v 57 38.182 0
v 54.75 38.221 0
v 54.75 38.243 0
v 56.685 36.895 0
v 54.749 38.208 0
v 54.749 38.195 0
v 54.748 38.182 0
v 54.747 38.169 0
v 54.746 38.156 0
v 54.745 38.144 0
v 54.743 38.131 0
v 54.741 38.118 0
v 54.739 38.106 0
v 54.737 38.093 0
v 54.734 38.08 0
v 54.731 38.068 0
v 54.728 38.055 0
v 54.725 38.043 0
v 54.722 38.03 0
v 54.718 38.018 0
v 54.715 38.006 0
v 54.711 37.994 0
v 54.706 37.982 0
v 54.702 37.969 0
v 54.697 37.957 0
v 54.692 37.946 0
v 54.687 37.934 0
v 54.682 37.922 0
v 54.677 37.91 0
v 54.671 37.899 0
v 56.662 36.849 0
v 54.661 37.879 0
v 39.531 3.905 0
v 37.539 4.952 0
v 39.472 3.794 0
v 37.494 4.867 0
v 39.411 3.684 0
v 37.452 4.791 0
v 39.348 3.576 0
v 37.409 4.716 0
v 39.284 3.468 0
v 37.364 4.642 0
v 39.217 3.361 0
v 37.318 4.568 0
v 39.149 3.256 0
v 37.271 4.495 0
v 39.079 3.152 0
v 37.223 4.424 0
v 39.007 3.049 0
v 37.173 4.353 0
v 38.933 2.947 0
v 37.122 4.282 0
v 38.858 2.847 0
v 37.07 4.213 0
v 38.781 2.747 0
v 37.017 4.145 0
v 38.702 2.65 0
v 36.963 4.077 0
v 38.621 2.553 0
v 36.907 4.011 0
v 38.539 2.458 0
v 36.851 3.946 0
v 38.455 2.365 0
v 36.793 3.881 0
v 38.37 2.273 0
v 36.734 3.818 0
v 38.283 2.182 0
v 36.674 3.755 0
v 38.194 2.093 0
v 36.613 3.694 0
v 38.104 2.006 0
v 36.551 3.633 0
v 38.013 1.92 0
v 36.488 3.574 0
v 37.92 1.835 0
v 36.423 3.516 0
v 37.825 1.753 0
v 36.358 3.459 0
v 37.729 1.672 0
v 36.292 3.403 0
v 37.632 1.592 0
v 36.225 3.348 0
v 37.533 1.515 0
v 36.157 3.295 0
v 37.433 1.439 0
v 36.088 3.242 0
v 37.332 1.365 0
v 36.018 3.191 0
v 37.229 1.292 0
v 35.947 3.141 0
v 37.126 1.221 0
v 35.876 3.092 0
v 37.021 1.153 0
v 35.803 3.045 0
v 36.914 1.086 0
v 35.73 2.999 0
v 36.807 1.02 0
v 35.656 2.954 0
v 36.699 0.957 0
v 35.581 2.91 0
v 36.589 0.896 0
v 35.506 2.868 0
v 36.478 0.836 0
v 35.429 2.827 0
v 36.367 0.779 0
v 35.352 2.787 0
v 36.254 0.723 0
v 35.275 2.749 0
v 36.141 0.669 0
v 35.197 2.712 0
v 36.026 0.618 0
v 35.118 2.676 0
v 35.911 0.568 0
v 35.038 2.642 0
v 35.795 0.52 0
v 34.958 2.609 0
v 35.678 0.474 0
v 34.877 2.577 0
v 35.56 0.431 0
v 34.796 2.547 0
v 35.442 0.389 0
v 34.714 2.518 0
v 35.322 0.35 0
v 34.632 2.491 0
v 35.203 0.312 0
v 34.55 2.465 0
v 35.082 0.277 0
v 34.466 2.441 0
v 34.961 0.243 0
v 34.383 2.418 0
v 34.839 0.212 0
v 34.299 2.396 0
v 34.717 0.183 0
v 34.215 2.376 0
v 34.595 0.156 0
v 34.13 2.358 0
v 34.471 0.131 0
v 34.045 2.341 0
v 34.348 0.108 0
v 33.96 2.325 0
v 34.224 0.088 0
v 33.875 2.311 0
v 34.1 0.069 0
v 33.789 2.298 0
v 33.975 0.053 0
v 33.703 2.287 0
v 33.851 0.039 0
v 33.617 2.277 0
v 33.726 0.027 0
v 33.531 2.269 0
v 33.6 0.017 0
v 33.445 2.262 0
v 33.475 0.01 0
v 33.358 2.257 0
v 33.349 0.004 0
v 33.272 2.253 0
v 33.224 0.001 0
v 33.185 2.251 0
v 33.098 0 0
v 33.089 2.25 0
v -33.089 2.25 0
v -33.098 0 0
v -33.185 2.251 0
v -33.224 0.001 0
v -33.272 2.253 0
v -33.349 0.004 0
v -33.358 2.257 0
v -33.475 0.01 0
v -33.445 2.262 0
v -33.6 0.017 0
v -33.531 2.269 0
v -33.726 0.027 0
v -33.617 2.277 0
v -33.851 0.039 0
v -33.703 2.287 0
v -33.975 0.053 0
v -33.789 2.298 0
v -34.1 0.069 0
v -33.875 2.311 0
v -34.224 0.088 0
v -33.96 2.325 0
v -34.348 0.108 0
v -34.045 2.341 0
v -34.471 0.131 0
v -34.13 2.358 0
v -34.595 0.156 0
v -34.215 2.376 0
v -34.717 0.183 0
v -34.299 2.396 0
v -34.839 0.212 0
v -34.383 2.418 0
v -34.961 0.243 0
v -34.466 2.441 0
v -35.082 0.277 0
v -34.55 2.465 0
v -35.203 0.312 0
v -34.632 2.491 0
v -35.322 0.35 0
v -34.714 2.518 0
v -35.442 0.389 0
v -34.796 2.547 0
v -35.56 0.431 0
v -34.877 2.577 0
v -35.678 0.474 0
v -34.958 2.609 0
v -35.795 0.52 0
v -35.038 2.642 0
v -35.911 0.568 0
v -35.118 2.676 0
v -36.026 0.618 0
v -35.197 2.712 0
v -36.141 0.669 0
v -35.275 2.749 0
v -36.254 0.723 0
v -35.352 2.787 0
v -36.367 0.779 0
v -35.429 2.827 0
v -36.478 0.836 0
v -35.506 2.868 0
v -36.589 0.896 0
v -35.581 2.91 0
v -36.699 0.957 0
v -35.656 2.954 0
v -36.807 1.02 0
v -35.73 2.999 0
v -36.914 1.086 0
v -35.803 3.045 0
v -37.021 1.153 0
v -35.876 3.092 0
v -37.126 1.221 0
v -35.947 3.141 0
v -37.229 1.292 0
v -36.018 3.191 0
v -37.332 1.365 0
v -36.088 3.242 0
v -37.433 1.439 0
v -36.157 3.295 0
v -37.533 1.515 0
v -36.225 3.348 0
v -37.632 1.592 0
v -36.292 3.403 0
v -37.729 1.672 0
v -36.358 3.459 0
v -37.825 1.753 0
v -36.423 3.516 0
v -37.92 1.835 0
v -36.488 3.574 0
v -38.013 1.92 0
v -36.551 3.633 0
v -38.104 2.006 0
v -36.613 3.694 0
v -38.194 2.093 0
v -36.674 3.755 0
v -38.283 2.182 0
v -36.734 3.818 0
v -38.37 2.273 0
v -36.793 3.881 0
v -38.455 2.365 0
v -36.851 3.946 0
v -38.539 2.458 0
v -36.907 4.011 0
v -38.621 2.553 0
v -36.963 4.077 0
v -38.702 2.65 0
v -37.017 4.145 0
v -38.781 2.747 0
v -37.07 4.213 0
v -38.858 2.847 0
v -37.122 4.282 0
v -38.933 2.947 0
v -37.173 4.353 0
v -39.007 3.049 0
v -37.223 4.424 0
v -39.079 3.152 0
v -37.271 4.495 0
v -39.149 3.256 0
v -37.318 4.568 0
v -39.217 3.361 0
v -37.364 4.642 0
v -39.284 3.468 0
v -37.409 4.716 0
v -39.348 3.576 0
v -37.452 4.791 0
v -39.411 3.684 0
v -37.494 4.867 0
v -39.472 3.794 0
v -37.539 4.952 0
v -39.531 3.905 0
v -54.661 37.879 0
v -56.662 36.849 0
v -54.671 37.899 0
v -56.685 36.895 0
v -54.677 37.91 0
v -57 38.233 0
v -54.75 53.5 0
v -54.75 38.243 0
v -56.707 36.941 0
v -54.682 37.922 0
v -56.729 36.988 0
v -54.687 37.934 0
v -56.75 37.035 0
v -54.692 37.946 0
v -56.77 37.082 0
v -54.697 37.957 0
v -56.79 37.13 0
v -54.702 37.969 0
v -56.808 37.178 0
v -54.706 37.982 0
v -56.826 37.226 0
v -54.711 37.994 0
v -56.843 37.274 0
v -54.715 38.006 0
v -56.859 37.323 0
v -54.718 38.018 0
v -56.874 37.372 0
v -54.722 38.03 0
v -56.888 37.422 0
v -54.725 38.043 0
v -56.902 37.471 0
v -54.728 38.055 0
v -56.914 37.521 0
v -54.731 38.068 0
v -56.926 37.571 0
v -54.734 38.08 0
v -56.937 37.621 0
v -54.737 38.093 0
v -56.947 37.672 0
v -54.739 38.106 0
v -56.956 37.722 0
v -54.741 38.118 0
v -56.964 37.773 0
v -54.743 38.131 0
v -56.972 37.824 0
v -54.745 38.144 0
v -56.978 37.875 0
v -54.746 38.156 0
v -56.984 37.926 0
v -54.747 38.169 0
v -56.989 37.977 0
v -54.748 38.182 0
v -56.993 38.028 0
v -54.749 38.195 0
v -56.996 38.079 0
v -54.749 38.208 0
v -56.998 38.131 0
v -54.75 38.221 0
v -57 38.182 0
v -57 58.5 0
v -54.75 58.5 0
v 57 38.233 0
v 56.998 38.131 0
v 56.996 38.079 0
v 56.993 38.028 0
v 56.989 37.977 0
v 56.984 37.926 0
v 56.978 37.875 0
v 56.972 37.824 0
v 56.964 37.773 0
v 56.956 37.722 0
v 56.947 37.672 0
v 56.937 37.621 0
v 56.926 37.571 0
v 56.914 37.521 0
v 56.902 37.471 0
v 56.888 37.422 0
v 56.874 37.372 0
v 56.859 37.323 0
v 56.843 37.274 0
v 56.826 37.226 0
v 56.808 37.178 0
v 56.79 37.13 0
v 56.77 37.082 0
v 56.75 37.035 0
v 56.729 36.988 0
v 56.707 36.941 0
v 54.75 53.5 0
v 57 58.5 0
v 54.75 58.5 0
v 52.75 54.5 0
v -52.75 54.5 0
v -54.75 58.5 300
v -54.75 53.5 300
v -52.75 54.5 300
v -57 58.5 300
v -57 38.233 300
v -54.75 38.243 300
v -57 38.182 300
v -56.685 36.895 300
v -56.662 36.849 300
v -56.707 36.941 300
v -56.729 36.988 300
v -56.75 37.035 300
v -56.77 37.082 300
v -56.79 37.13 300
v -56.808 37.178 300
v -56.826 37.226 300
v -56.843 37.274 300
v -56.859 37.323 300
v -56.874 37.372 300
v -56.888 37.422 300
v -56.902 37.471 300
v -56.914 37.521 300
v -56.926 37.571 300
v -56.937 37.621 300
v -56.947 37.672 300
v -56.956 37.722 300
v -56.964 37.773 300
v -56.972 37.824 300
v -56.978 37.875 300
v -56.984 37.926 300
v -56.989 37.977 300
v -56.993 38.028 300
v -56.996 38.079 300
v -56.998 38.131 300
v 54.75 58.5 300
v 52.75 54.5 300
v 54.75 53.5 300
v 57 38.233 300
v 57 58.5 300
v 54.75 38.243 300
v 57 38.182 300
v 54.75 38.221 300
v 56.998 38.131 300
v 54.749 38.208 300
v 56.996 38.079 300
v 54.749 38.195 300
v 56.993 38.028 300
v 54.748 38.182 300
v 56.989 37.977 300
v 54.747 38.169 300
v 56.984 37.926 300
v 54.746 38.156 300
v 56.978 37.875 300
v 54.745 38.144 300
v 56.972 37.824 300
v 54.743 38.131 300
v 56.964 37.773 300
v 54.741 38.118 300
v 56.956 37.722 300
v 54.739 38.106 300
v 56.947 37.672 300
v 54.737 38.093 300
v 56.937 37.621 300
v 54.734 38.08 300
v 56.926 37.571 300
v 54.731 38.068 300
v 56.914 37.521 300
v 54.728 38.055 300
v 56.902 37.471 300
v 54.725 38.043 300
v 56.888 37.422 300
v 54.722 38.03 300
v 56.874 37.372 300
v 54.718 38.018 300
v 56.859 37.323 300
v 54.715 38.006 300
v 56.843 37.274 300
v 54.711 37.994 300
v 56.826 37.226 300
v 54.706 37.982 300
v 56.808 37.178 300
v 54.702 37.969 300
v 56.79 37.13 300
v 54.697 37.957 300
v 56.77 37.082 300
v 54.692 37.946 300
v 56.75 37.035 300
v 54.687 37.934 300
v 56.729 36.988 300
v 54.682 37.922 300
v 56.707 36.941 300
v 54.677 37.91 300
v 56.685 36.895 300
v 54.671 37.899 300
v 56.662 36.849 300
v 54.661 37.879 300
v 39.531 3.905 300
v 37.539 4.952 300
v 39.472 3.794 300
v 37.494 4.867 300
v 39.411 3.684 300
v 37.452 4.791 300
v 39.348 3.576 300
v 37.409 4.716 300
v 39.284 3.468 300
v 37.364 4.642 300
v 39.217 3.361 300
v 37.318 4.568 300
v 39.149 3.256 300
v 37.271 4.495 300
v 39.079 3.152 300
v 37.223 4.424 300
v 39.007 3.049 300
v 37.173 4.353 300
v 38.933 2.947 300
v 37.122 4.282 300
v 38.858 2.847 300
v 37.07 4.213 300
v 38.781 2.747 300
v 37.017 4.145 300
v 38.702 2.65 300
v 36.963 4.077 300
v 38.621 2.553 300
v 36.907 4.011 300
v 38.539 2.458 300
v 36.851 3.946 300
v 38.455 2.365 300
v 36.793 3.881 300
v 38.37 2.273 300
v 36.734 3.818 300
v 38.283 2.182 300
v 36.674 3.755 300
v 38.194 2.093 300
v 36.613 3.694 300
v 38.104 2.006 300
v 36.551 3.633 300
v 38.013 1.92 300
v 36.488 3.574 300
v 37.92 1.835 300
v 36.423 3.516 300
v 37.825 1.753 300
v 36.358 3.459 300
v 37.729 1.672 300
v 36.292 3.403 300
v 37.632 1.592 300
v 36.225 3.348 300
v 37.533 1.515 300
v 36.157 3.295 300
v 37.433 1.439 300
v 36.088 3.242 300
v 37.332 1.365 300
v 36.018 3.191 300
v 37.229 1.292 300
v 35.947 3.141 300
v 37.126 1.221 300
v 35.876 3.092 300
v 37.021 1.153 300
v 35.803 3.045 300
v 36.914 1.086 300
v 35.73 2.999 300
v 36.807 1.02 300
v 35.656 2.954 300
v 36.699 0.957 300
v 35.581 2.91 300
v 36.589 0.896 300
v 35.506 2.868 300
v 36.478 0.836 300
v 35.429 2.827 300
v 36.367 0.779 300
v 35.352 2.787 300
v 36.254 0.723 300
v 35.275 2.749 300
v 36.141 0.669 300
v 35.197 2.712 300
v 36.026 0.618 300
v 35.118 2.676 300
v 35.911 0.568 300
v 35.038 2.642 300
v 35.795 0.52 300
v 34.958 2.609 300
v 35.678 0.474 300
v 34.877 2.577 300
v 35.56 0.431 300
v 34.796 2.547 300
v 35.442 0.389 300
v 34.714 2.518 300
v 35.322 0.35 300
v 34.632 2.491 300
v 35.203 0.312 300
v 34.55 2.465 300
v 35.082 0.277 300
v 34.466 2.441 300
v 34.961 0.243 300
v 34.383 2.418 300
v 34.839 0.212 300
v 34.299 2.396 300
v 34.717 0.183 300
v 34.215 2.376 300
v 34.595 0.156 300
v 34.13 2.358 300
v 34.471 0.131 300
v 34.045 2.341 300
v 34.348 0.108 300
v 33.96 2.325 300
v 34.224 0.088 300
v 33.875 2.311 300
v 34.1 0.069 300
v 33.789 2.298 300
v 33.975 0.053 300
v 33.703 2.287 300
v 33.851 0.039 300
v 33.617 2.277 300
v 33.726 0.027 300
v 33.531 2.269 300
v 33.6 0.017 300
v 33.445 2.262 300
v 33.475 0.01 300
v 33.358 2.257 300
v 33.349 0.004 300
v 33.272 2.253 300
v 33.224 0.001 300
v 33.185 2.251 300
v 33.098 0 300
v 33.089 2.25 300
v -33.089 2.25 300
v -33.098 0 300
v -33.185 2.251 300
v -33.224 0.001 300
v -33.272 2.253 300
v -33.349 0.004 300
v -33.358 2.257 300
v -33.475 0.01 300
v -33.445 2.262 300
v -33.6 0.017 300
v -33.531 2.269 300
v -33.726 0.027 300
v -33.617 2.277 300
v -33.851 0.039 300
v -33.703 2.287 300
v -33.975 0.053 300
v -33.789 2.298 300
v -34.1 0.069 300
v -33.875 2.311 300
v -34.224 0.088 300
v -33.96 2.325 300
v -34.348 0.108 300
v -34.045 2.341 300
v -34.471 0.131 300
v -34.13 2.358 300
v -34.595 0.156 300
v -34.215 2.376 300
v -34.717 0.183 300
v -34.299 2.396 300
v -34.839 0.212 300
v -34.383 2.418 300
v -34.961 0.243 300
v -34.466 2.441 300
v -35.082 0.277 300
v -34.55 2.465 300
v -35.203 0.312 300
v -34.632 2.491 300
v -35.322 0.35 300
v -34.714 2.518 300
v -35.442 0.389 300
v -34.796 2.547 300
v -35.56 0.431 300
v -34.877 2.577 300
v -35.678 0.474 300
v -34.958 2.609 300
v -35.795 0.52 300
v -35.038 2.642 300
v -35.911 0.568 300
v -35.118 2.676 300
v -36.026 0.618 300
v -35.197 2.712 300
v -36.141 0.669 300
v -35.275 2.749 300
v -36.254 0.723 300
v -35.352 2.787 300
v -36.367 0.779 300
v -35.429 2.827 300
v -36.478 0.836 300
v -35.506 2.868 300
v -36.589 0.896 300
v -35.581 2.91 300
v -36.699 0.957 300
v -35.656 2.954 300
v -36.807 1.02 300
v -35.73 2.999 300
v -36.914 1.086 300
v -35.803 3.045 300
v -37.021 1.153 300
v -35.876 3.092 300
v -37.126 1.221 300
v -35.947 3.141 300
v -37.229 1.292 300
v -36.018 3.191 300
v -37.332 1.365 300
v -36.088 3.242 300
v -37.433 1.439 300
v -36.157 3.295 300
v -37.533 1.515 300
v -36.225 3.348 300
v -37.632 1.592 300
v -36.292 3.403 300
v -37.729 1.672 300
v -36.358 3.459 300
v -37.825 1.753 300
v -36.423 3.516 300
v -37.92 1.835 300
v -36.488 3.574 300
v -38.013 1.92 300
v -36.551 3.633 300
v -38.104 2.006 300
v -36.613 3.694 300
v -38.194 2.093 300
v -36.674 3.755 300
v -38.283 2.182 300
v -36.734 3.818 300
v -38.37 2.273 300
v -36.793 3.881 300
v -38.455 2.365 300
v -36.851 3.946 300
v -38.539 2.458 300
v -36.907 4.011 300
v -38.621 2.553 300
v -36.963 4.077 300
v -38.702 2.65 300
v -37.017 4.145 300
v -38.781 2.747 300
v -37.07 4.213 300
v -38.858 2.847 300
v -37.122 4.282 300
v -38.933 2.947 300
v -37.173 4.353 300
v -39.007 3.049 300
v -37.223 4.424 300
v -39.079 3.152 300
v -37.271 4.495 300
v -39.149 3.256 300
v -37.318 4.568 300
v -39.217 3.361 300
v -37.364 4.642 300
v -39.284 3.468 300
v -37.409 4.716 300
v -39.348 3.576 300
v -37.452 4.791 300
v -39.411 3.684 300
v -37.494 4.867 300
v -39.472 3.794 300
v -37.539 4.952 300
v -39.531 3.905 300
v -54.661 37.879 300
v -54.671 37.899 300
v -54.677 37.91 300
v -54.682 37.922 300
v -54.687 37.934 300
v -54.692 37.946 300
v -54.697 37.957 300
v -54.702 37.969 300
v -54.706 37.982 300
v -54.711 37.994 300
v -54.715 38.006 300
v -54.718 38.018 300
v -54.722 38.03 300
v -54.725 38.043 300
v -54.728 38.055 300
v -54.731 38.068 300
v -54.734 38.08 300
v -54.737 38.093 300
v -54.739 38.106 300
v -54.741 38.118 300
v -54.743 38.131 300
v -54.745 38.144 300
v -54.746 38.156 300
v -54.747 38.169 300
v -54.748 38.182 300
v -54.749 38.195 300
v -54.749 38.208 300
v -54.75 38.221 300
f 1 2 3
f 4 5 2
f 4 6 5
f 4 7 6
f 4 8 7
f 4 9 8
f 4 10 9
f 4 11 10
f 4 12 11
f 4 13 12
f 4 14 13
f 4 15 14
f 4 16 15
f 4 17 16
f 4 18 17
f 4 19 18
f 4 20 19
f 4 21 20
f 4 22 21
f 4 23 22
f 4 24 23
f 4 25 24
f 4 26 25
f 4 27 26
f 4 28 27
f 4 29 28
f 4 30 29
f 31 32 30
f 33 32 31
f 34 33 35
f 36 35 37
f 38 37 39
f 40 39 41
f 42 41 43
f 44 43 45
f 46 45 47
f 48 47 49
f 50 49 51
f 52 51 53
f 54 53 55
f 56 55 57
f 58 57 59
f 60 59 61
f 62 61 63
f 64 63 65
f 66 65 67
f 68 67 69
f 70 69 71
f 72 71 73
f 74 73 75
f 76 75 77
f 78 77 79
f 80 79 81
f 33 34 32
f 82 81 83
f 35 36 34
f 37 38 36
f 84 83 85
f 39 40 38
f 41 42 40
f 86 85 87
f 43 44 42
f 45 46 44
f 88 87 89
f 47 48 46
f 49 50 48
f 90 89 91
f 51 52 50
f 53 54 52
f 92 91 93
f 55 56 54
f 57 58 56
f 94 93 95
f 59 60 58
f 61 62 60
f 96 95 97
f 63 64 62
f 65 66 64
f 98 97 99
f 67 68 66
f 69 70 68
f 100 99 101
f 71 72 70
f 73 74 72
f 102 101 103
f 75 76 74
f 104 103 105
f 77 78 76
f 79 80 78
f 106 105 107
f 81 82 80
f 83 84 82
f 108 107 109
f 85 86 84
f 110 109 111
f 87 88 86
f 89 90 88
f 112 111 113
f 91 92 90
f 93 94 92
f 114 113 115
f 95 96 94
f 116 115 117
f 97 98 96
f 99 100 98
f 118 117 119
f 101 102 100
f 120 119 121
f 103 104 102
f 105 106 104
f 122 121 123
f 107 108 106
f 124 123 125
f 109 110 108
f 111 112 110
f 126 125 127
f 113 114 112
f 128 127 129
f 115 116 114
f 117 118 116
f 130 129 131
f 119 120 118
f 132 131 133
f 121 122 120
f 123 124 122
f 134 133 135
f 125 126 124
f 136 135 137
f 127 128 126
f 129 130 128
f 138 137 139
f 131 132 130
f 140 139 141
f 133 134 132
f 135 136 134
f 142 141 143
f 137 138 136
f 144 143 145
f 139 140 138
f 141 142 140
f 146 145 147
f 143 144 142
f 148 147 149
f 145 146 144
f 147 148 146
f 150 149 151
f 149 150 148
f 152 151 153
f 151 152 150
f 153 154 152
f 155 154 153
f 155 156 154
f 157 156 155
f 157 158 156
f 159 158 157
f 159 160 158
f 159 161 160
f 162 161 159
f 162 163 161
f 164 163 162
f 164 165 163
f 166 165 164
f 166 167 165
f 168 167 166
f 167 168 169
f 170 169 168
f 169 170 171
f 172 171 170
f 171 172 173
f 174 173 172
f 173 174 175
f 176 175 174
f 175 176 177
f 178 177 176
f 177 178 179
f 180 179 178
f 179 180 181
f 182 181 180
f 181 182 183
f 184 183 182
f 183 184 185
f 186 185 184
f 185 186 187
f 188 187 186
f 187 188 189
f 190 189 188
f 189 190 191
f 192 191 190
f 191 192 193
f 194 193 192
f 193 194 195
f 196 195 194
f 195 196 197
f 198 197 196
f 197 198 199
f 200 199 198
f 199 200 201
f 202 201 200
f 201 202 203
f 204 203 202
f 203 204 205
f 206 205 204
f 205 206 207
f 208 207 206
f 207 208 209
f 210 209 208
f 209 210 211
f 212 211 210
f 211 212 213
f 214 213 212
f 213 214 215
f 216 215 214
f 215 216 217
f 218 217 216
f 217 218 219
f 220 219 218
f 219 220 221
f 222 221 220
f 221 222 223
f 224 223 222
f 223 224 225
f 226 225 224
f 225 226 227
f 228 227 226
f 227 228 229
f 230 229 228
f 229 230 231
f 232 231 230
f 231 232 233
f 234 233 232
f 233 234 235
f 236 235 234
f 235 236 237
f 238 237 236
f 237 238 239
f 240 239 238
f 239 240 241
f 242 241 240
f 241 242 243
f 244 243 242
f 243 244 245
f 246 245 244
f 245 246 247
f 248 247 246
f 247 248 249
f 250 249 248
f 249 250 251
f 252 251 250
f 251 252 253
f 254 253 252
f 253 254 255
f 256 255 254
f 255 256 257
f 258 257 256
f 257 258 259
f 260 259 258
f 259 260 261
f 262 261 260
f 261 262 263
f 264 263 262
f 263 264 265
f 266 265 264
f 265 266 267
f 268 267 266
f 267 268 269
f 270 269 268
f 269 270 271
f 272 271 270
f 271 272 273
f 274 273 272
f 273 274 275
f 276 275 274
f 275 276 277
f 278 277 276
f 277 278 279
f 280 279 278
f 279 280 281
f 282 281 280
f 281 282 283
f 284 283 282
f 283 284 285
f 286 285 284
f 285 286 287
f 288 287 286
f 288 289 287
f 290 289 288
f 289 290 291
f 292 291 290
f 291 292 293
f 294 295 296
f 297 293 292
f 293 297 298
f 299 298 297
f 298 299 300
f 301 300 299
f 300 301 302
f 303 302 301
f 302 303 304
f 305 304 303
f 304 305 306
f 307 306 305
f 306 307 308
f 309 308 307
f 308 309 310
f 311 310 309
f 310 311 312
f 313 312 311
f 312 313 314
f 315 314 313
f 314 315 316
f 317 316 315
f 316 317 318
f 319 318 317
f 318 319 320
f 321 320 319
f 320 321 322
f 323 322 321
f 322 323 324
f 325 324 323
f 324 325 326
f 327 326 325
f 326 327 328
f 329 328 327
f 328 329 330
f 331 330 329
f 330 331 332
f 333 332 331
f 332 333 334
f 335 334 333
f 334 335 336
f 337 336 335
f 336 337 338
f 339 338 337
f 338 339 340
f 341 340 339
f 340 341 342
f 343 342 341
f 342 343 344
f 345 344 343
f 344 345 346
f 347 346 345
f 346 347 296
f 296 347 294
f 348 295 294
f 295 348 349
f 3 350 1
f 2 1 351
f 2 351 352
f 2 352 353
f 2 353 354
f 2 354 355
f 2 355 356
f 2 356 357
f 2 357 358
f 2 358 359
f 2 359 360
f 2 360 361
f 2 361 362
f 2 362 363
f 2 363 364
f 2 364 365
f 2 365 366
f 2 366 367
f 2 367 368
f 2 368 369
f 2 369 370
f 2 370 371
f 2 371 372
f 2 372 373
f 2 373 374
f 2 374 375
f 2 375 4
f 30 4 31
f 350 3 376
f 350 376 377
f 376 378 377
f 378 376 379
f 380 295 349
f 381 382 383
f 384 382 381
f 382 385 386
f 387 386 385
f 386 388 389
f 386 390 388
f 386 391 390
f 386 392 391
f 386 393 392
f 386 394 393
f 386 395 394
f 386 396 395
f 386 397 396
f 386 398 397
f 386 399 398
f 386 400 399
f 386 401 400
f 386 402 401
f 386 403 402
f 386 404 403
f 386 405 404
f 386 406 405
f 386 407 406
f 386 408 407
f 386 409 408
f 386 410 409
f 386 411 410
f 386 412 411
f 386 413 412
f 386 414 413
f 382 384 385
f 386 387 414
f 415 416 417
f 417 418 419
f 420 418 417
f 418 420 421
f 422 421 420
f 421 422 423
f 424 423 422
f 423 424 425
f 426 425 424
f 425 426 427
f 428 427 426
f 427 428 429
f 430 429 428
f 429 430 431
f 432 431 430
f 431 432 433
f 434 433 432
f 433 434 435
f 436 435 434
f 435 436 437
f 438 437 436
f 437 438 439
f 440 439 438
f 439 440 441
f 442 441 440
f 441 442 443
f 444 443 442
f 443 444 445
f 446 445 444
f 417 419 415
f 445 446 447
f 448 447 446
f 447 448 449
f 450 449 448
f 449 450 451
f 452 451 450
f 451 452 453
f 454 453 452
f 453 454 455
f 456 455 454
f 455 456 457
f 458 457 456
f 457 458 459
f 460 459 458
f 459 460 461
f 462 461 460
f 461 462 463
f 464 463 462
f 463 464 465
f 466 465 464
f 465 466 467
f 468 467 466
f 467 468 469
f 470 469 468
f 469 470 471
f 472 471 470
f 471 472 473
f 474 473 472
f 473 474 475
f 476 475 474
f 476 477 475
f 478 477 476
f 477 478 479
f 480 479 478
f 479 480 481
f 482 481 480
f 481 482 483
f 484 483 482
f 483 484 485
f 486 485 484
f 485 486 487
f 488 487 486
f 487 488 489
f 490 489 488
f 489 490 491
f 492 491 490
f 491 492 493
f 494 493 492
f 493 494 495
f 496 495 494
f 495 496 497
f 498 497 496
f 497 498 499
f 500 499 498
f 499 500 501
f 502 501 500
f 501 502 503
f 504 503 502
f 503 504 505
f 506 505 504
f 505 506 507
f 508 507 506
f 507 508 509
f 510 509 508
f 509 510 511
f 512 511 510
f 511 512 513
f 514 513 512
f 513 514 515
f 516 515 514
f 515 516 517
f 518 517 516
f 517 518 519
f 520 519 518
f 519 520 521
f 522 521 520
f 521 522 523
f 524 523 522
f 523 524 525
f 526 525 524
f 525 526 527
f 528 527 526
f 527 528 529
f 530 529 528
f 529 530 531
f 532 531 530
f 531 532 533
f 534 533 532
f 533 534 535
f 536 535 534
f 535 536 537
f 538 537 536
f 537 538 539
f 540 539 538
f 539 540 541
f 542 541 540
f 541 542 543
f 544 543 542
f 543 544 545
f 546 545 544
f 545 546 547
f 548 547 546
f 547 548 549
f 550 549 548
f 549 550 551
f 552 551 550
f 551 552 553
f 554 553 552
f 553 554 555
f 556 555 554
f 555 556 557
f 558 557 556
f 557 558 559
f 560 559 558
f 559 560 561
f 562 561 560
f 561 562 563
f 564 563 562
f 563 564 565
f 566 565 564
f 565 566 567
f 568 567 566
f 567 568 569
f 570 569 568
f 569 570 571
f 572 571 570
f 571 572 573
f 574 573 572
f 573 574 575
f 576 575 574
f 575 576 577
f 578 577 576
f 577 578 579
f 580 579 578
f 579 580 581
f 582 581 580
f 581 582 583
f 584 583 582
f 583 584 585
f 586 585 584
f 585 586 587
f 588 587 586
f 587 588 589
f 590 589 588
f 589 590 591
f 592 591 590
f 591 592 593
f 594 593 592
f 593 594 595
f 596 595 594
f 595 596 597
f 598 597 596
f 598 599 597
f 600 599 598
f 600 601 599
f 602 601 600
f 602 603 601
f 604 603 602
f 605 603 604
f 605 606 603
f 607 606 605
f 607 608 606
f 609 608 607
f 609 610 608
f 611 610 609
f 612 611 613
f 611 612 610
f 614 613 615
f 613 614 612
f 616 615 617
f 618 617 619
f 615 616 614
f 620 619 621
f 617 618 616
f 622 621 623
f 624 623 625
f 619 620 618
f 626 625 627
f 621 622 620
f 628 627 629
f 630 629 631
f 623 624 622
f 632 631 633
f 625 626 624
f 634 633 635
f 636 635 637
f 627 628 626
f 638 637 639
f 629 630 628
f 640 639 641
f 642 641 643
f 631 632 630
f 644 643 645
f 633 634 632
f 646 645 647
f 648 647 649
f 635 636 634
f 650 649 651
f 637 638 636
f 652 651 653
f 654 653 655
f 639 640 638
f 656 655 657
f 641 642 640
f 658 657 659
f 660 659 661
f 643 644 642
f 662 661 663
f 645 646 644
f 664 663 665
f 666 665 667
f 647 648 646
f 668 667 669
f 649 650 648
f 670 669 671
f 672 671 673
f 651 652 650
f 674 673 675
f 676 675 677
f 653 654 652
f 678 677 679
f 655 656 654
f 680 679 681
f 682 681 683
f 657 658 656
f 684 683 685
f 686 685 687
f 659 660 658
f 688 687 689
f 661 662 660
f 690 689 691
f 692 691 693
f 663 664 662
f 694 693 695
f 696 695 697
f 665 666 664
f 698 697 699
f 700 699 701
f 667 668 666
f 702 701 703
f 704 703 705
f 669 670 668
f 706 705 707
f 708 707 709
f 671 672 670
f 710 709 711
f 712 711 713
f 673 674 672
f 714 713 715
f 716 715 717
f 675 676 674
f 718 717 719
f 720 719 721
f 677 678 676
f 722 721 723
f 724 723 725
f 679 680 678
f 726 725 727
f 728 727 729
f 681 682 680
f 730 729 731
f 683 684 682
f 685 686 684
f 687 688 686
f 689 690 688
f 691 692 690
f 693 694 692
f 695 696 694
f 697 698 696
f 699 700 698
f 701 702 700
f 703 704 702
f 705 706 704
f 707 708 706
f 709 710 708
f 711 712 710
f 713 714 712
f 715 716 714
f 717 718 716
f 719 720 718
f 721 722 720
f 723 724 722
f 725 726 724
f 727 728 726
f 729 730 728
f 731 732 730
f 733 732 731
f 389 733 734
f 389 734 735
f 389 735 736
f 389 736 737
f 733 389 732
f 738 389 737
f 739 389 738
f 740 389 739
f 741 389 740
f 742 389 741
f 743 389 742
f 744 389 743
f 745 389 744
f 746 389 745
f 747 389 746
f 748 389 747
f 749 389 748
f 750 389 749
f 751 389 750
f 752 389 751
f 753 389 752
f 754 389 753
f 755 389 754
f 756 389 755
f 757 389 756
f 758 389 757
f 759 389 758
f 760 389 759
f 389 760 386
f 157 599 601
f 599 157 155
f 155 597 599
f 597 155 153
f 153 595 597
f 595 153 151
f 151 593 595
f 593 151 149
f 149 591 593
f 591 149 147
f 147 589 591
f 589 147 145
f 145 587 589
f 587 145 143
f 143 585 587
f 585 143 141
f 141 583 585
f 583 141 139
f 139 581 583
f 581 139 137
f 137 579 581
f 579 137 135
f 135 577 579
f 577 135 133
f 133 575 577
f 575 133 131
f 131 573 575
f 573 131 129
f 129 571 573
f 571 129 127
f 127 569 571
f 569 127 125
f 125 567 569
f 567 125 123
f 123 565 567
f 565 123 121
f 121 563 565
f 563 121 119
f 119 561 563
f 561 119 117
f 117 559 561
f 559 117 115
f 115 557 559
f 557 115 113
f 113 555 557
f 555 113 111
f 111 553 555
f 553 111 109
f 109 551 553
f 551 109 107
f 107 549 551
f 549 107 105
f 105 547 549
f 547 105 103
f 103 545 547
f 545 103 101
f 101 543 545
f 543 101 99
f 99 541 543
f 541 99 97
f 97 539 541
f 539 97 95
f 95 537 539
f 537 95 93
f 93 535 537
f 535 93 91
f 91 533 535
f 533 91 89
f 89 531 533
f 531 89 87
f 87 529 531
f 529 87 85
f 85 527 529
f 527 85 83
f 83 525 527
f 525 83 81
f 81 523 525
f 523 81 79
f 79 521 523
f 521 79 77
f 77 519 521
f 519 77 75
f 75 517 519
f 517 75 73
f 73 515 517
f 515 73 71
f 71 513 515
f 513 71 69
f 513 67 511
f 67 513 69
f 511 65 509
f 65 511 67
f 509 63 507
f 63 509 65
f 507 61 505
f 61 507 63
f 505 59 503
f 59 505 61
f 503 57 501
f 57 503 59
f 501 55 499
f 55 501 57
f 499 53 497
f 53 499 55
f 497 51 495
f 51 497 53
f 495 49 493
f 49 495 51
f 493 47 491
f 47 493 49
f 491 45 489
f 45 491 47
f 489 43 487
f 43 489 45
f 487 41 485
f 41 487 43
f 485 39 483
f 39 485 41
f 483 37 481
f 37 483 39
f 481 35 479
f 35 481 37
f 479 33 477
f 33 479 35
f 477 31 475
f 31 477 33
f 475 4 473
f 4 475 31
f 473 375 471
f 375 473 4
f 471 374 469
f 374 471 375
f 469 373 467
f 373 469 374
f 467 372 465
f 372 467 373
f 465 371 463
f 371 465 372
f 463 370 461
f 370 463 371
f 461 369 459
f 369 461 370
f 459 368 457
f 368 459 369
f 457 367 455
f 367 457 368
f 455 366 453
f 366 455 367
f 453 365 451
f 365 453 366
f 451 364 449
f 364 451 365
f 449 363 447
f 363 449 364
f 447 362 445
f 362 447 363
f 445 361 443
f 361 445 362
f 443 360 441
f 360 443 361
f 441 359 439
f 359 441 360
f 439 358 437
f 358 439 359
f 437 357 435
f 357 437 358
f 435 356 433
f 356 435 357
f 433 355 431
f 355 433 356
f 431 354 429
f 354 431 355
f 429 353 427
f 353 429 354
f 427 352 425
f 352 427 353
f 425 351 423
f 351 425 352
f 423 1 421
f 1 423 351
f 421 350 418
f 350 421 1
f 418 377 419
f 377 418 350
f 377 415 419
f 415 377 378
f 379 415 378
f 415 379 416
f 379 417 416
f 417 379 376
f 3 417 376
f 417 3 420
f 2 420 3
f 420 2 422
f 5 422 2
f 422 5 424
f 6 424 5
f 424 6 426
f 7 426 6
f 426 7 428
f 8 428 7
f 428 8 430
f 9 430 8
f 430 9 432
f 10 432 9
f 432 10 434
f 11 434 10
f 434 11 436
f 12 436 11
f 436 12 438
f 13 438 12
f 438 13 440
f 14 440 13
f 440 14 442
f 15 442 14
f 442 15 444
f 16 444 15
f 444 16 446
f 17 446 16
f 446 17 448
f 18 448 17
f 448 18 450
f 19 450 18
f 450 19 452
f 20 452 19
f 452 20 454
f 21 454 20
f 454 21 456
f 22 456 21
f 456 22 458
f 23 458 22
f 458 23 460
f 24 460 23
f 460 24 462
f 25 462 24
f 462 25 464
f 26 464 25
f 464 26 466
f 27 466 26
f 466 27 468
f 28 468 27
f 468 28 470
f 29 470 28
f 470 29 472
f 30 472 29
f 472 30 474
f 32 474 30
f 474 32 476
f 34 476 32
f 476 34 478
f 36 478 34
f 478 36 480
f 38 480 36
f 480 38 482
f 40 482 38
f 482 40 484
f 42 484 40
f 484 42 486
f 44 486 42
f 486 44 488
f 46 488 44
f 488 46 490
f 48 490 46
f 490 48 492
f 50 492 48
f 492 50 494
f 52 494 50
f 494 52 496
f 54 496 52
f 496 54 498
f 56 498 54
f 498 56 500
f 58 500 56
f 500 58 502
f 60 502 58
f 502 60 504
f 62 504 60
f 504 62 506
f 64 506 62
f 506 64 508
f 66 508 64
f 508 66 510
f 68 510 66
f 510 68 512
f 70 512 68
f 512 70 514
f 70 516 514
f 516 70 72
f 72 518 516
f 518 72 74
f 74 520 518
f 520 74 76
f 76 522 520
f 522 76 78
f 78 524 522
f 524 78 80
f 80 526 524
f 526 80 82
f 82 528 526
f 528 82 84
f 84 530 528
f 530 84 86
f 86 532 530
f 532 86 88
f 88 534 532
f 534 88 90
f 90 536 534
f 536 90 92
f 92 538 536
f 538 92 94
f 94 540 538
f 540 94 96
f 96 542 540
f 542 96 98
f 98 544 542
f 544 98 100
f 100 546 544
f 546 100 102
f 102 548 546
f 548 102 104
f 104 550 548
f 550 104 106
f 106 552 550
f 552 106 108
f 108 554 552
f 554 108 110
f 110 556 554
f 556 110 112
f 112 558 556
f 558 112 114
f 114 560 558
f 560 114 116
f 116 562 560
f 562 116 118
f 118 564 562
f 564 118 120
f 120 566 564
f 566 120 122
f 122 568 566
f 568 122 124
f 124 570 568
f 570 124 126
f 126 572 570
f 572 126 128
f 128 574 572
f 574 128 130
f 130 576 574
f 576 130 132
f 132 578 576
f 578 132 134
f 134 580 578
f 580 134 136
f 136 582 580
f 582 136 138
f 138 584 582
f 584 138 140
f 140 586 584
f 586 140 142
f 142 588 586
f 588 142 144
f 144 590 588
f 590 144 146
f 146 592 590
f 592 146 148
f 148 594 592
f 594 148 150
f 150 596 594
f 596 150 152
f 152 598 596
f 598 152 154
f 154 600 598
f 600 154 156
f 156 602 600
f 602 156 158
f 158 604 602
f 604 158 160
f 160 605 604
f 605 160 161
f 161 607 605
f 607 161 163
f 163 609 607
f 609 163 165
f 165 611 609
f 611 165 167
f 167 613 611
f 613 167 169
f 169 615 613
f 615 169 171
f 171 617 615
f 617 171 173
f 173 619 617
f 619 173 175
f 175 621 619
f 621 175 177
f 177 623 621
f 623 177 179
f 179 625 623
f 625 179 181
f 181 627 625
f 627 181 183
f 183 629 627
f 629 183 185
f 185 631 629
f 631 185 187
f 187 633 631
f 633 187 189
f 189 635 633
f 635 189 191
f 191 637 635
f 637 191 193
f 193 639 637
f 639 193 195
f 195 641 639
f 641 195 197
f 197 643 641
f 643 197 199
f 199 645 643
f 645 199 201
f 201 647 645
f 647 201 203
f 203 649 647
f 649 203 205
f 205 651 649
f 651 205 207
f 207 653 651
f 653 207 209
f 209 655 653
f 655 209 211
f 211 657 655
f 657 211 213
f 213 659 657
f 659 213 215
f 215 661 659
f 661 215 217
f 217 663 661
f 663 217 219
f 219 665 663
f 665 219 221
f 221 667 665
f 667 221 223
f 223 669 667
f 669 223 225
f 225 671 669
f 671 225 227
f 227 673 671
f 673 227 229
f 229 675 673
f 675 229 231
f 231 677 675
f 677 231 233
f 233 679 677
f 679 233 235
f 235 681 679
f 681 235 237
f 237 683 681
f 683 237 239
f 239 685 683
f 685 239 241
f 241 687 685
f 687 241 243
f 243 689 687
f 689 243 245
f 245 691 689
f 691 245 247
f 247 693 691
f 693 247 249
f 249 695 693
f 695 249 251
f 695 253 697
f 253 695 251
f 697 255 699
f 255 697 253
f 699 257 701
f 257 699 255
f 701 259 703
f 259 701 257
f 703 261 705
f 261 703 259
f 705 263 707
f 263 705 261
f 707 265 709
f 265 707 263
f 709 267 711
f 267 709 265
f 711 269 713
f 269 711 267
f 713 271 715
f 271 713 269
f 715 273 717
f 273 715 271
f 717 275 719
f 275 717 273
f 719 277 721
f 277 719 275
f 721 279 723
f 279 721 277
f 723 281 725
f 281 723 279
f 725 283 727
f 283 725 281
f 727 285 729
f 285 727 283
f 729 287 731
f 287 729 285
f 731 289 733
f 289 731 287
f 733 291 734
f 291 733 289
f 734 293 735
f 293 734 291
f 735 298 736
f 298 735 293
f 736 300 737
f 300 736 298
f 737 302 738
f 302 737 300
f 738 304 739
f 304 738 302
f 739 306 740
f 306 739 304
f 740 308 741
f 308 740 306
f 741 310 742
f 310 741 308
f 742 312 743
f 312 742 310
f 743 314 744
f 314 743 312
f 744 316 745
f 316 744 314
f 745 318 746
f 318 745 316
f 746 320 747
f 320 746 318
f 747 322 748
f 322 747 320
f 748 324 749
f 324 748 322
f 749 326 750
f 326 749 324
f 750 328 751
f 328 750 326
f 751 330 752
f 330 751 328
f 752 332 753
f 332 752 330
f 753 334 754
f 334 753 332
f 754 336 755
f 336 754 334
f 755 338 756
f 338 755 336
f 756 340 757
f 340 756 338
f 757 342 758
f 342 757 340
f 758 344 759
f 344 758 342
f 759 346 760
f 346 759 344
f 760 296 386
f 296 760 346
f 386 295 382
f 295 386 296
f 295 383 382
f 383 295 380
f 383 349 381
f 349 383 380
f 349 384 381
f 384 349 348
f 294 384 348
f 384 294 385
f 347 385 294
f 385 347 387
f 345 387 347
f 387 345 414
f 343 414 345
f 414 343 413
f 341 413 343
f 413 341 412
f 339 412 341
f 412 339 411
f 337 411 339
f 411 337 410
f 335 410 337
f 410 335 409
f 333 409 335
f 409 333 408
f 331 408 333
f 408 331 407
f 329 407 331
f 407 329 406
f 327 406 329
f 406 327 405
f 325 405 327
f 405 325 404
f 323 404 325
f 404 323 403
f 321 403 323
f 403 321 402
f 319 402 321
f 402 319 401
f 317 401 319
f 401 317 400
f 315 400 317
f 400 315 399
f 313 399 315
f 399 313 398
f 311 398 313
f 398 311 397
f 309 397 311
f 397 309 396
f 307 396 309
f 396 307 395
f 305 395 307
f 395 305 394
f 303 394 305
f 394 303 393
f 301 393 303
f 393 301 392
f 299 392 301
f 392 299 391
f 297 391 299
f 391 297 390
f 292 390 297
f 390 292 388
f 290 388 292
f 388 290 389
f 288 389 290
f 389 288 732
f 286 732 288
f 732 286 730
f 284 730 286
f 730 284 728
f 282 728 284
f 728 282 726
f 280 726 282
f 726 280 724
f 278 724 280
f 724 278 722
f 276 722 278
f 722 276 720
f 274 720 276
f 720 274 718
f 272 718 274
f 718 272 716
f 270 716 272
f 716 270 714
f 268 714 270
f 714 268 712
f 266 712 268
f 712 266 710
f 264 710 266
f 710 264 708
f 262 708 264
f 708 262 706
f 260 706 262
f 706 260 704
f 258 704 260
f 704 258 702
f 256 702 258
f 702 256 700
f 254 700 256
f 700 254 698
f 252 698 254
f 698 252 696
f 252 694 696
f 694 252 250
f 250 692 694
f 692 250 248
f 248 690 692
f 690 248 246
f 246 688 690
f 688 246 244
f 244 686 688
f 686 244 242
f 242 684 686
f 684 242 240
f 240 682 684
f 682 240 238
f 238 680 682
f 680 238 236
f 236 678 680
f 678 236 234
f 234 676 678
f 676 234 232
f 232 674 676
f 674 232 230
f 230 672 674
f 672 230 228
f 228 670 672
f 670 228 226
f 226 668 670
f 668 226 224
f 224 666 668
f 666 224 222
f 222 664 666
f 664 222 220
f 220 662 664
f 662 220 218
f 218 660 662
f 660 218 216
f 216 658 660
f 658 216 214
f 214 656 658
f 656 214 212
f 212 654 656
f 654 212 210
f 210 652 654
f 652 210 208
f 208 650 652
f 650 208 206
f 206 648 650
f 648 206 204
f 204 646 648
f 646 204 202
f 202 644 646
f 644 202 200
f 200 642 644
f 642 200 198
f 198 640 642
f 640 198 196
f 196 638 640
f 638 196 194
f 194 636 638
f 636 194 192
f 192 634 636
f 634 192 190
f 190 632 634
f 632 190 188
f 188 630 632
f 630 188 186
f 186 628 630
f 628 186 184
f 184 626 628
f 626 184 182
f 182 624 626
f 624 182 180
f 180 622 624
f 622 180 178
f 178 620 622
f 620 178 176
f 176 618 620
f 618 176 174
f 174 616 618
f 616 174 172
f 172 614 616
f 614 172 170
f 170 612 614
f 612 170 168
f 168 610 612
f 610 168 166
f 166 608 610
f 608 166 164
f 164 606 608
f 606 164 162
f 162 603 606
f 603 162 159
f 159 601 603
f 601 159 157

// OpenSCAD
$fn = 50;

difference() {
	union() {
		linear_extrude(height = 300.0) {
			polygon(points = [[56.9995601, 38.1820114], [56.9982404, 38.1306519], [56.9960415, 38.0793225], [56.9929638, 38.0280383], [56.9890084, 37.9768144], [56.9841763, 37.9256657], [56.978469, 37.8746072], [56.9718882, 37.823654], [56.9644358, 37.7728209], [56.956114, 37.7221229], [56.9469252, 37.6715749], [56.9368722, 37.6211916], [56.9259578, 37.5709879], [56.9141852, 37.5209784], [56.901558, 37.4711779], [56.8880798, 37.4216009], [56.8737546, 37.372262], [56.8585866, 37.3231757], [56.8425802, 37.2743563], [56.8257401, 37.2258182], [56.8080713, 37.1775755], [56.7895789, 37.1296426], [56.7702684, 37.0820333], [56.7501454, 37.0347617], [56.7292159, 36.9878416], [56.7074859, 36.9412868], [56.6849619, 36.895111], [56.6616504, 36.8493277], [39.5307002, 3.9051927], [39.4717998, 3.7942803], [39.4109872, 3.6844047], [39.3482805, 3.575599], [39.2836987, 3.4678957], [39.2172609, 3.3613272], [39.1489873, 3.2559255], [39.0788983, 3.1517221], [39.0070149, 3.0487484], [38.9333586, 2.9470352], [38.8579516, 2.8466131], [38.7808165, 2.7475122], [38.7019765, 2.6497622], [38.6214552, 2.5533924], [38.5392767, 2.4584319], [38.4554658, 2.3649089], [38.3700475, 2.2728517], [38.2830475, 2.1822879], [38.1944919, 2.0932445], [38.1044072, 2.0057484], [38.0128206, 1.9198257], [37.9197594, 1.8355024], [37.8252517, 1.7528035], [37.7293256, 1.6717541], [37.6320102, 1.5923783], [37.5333344, 1.5147001], [37.433328, 1.4387427], [37.3320209, 1.3645289], [37.2294436, 1.2920809], [37.1256268, 1.2214206], [37.0206017, 1.152569], [36.9143997, 1.085547], [36.8070528, 1.0203745], [36.6985931, 0.9570711], [36.5890533, 0.8956559], [36.478466, 0.8361472], [36.3668647, 0.778563], [36.2542826, 0.7229204], [36.1407537, 0.6692362], [36.0263119, 0.6175265], [35.9109917, 0.5678068], [35.7948275, 0.520092], [35.6778543, 0.4743964], [35.5601072, 0.4307338], [35.4416214, 0.3891172], [35.3224326, 0.3495592], [35.2025764, 0.3120716], [35.082089, 0.2766656], [34.9610063, 0.2433519], [34.8393648, 0.2121405], [34.7172009, 0.1830407], [34.5945513, 0.1560613], [34.4714528, 0.1312103], [34.3479423, 0.1084953], [34.2240569, 0.0879229], [34.0998338, 0.0694995], [33.9753101, 0.0532305], [33.8505234, 0.0391209], [33.725511, 0.0271747], [33.6003104, 0.0173958], [33.4749592, 0.0097868], [33.3494951, 0.0043502], [33.2239556, 0.0010876], [33.0983784, -0.0], [-33.0983784, -0.0], [-33.2239556, 0.0010876], [-33.3494951, 0.0043502], [-33.4749592, 0.0097868], [-33.6003104, 0.0173958], [-33.725511, 0.0271747], [-33.8505234, 0.0391209], [-33.9753101, 0.0532305], [-34.0998338, 0.0694995], [-34.2240569, 0.0879229], [-34.3479423, 0.1084953], [-34.4714528, 0.1312103], [-34.5945513, 0.1560613], [-34.7172009, 0.1830407], [-34.8393648, 0.2121405], [-34.9610063, 0.2433519], [-35.082089, 0.2766656], [-35.2025764, 0.3120716], [-35.3224326, 0.3495592], [-35.4416214, 0.3891172], [-35.5601072, 0.4307338], [-35.6778543, 0.4743964], [-35.7948275, 0.520092], [-35.9109917, 0.5678068], [-36.0263119, 0.6175265], [-36.1407537, 0.6692362], [-36.2542826, 0.7229204], [-36.3668647, 0.778563], [-36.478466, 0.8361472], [-36.5890533, 0.8956559], [-36.6985931, 0.9570711], [-36.8070528, 1.0203745], [-36.9143997, 1.085547], [-37.0206017, 1.152569], [-37.1256268, 1.2214206], [-37.2294436, 1.2920809], [-37.3320209, 1.3645289], [-37.433328, 1.4387427], [-37.5333344, 1.5147001], [-37.6320102, 1.5923783], [-37.7293256, 1.6717541], [-37.8252517, 1.7528035], [-37.9197594, 1.8355024], [-38.0128206, 1.9198257], [-38.1044072, 2.0057484], [-38.1944919, 2.0932445], [-38.2830475, 2.1822879], [-38.3700475, 2.2728517], [-38.4554658, 2.3649089], [-38.5392767, 2.4584319], [-38.6214552, 2.5533924], [-38.7019765, 2.6497622], [-38.7808165, 2.7475122], [-38.8579516, 2.8466131], [-38.9333586, 2.9470352], [-39.0070149, 3.0487484], [-39.0788983, 3.1517221], [-39.1489873, 3.2559255], [-39.2172609, 3.3613272], [-39.2836987, 3.4678957], [-39.3482805, 3.575599], [-39.4109872, 3.6844047], [-39.4717998, 3.7942803], [-39.5307002, 3.9051927], [-56.6616504, 36.8493277], [-56.6849619, 36.895111], [-56.7074859, 36.9412868], [-56.7292159, 36.9878416], [-56.7501454, 37.0347617], [-56.7702684, 37.0820333], [-56.7895789, 37.1296426], [-56.8080713, 37.1775755], [-56.8257401, 37.2258182], [-56.8425802, 37.2743563], [-56.8585866, 37.3231757], [-56.8737546, 37.372262], [-56.8880798, 37.4216009], [-56.901558, 37.4711779], [-56.9141852, 37.5209784], [-56.9259578, 37.5709879], [-56.9368722, 37.6211916], [-56.9469252, 37.6715749], [-56.956114, 37.7221229], [-56.9644358, 37.7728209], [-56.9718882, 37.823654], [-56.978469, 37.8746072], [-56.9841763, 37.9256657], [-56.9890084, 37.9768144], [-56.9929638, 38.0280383], [-56.9960415, 38.0793225], [-56.9982404, 38.1306519], [-56.9995601, 38.1820114], [-57.0, 38.2333859], [-57.0, 58.5], [-54.75, 58.5], [-52.75, 54.5], [-54.75, 53.5], [-54.75, 38.2430192], [-54.7498075, 38.2205437], [-54.7494777, 38.2077052], [-54.748928, 38.1948743], [-54.7481587, 38.1820547], [-54.7471699, 38.1692501], [-54.745962, 38.1564643], [-54.7445354, 38.1437011], [-54.7428903, 38.1309642], [-54.7410275, 38.1182573], [-54.7389472, 38.1055842], [-54.7366503, 38.0929486], [-54.7341373, 38.0803542], [-54.731409, 38.0678046], [-54.7284662, 38.0553036], [-54.7253097, 38.0428549], [-54.7219405, 38.030462], [-54.7183596, 38.0181286], [-54.714568, 38.0058584], [-54.7105669, 37.9936549], [-54.7063573, 37.9815217], [-54.7019406, 37.9694623], [-54.697318, 37.9574804], [-54.6924909, 37.9455794], [-54.6874607, 37.9337628], [-54.6822289, 37.9220341], [-54.676797, 37.9103967], [-54.6711666, 37.898854], [-54.6609683, 37.8788246], [-37.5389576, 4.951881], [-37.4937673, 4.8667852], [-37.4518282, 4.7910103], [-37.408583, 4.7159731], [-37.3640445, 4.6416962], [-37.3182262, 4.568202], [-37.2711417, 4.4955123], [-37.2228052, 4.4236492], [-37.1732313, 4.352634], [-37.1224347, 4.2824882], [-37.0704308, 4.2132327], [-37.0172351, 4.1448884], [-36.9628636, 4.0774757], [-36.9073326, 4.011015], [-36.8506587, 3.945526], [-36.792859, 3.8810285], [-36.7339509, 3.8175419], [-36.6739519, 3.7550851], [-36.6128801, 3.6936769], [-36.5507538, 3.6333358], [-36.4875917, 3.5740798], [-36.4234126, 3.5159267], [-36.358236, 3.458894], [-36.2920812, 3.4029988], [-36.2249682, 3.3482578], [-36.1569171, 3.2946875], [-36.0879483, 3.242304], [-36.0180826, 3.1911229], [-35.9473408, 3.1411596], [-35.8757442, 3.0924292], [-35.8033143, 3.0449462], [-35.7300728, 2.9987248], [-35.6560417, 2.9537791], [-35.5812432, 2.9101223], [-35.5056997, 2.8677677], [-35.429434, 2.8267279], [-35.3524688, 2.7870153], [-35.2748273, 2.7486418], [-35.1965328, 2.7116188], [-35.1176088, 2.6759575], [-35.0380789, 2.6416687], [-34.9579671, 2.6087625], [-34.8772973, 2.5772488], [-34.7960937, 2.5471372], [-34.7143808, 2.5184366], [-34.632183, 2.4911556], [-34.549525, 2.4653026], [-34.4664316, 2.4408851], [-34.3829277, 2.4179105], [-34.2990384, 2.3963857], [-34.2147889, 2.3763172], [-34.1302044, 2.357711], [-34.0453103, 2.3405727], [-33.9601321, 2.3249074], [-33.8746953, 2.3107199], [-33.7890256, 2.2980143], [-33.7031487, 2.2867945], [-33.6170903, 2.2770638], [-33.5308763, 2.2688253], [-33.4445326, 2.2620813], [-33.3580849, 2.2568338], [-33.2715594, 2.2530845], [-33.1849819, 2.2508345], [-33.0886348, 2.25], [33.0886348, 2.25], [33.1849819, 2.2508345], [33.2715594, 2.2530845], [33.3580849, 2.2568338], [33.4445326, 2.2620813], [33.5308763, 2.2688253], [33.6170903, 2.2770638], [33.7031487, 2.2867945], [33.7890256, 2.2980143], [33.8746953, 2.3107199], [33.9601321, 2.3249074], [34.0453103, 2.3405727], [34.1302044, 2.357711], [34.2147889, 2.3763172], [34.2990384, 2.3963857], [34.3829277, 2.4179105], [34.4664316, 2.4408851], [34.549525, 2.4653026], [34.632183, 2.4911556], [34.7143808, 2.5184366], [34.7960937, 2.5471372], [34.8772973, 2.5772488], [34.9579671, 2.6087625], [35.0380789, 2.6416687], [35.1176088, 2.6759575], [35.1965328, 2.7116188], [35.2748273, 2.7486418], [35.3524688, 2.7870153], [35.429434, 2.8267279], [35.5056997, 2.8677677], [35.5812432, 2.9101223], [35.6560417, 2.9537791], [35.7300728, 2.9987248], [35.8033143, 3.0449462], [35.8757442, 3.0924292], [35.9473408, 3.1411596], [36.0180826, 3.1911229], [36.0879483, 3.242304], [36.1569171, 3.2946875], [36.2249682, 3.3482578], [36.2920812, 3.4029988], [36.358236, 3.458894], [36.4234126, 3.5159267], [36.4875917, 3.5740798], [36.5507538, 3.6333358], [36.6128801, 3.6936769], [36.6739519, 3.7550851], [36.7339509, 3.8175419], [36.792859, 3.8810285], [36.8506587, 3.945526], [36.9073326, 4.011015], [36.9628636, 4.0774757], [37.0172351, 4.1448884], [37.0704308, 4.2132327], [37.1224347, 4.2824882], [37.1732313, 4.352634], [37.2228052, 4.4236492], [37.2711417, 4.4955123], [37.3182262, 4.568202], [37.3640445, 4.6416962], [37.408583, 4.7159731], [37.4518282, 4.7910103], [37.4937673, 4.8667852], [37.5389576, 4.951881], [54.6609683, 37.8788246], [54.6711666, 37.898854], [54.676797, 37.9103967], [54.6822289, 37.9220341], [54.6874607, 37.9337628], [54.6924909, 37.9455794], [54.697318, 37.9574804], [54.7019406, 37.9694623], [54.7063573, 37.9815217], [54.7105669, 37.9936549], [54.714568, 38.0058584], [54.7183596, 38.0181286], [54.7219405, 38.030462], [54.7253097, 38.0428549], [54.7284662, 38.0553036], [54.731409, 38.0678046], [54.7341373, 38.0803542], [54.7366503, 38.0929486], [54.7389472, 38.1055842], [54.7410275, 38.1182573], [54.7428903, 38.1309642], [54.7445354, 38.1437011], [54.745962, 38.1564643], [54.7471699, 38.1692501], [54.7481587, 38.1820547], [54.748928, 38.1948743], [54.7494777, 38.2077052], [54.7498075, 38.2205437], [54.75, 38.2430192], [54.75, 53.5], [52.75, 54.5], [54.75, 58.5], [57.0, 58.5], [57.0, 38.2333859]]);
		}
	}
	union();
}
